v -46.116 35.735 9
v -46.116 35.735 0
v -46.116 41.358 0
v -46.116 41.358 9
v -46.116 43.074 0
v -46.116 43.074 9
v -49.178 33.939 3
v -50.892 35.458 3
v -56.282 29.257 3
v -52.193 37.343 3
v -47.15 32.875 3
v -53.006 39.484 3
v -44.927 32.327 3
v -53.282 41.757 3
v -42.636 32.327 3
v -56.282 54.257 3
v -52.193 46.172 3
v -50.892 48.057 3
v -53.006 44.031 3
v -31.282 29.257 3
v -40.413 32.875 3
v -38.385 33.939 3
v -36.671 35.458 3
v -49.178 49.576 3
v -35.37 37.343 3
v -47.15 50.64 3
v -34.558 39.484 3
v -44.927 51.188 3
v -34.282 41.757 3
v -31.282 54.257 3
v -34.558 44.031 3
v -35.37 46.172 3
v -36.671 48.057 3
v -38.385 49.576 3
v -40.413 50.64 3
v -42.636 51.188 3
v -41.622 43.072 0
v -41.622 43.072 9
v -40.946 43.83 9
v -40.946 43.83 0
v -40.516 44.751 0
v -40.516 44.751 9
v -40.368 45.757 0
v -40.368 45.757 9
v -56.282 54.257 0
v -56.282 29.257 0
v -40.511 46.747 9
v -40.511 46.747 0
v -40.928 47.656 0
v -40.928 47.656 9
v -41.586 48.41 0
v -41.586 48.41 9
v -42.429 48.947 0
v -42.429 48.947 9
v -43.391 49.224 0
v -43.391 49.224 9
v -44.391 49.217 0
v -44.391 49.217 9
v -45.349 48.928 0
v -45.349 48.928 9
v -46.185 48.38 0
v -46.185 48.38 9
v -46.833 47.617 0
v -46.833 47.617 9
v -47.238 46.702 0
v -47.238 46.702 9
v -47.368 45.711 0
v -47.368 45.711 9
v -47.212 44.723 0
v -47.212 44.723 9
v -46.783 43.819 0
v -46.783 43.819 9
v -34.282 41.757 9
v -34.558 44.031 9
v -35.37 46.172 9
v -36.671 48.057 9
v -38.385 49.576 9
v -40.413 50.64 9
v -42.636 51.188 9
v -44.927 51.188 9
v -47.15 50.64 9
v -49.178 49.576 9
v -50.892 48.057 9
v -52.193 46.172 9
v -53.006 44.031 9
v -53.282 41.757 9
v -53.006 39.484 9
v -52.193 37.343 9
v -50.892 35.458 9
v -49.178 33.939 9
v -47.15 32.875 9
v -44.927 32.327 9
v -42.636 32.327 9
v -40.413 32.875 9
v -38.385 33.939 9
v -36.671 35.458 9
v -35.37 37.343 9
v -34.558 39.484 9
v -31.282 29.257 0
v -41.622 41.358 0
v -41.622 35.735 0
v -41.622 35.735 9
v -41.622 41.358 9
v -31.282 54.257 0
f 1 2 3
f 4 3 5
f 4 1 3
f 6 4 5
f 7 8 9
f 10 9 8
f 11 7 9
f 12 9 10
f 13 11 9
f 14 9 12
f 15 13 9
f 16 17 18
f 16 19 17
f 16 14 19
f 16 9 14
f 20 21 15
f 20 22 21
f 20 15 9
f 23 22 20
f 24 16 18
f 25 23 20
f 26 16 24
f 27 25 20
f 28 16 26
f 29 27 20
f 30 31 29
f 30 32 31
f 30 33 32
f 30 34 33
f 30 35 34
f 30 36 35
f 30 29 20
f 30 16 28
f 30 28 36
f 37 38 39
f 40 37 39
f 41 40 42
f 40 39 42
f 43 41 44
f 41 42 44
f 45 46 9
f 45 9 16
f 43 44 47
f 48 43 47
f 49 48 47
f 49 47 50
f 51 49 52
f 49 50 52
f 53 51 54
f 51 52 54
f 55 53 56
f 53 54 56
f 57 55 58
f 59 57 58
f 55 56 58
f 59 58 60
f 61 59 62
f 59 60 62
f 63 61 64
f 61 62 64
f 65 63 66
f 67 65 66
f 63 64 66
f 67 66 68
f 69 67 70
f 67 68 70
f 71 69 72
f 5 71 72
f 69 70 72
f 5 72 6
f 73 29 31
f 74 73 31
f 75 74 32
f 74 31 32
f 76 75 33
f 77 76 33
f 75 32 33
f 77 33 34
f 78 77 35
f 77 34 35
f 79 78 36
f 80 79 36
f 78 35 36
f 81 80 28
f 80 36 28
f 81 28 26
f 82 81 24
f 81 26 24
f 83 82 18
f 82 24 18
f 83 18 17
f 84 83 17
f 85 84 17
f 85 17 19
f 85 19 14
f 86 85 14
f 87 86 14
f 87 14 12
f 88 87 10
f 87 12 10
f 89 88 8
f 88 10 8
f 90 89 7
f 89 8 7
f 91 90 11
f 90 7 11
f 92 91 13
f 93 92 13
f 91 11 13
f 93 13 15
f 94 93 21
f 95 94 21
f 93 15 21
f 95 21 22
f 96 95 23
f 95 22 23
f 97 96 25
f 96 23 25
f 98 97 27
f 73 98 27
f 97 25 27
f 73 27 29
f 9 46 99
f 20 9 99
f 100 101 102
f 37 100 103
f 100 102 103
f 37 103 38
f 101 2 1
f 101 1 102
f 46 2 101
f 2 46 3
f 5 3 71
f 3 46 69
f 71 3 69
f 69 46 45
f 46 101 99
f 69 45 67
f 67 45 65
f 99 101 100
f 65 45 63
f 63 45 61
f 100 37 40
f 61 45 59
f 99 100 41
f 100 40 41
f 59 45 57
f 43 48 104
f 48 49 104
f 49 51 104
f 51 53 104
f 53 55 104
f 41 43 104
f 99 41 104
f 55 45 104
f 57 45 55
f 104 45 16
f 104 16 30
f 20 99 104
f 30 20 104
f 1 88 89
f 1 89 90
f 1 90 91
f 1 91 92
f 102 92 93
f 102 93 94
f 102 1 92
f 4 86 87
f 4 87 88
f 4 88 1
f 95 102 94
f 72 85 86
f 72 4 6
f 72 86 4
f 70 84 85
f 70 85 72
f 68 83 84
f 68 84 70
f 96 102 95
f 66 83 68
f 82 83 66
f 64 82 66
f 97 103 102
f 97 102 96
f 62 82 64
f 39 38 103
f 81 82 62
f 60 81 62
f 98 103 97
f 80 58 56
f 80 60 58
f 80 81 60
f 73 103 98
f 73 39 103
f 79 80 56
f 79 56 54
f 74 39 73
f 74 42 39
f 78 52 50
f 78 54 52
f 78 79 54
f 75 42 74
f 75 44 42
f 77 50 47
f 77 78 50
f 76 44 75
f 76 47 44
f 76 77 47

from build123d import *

# Parameters (mm, degrees)
F0_W     = 25
F0_H     = 25
F1_DEPTH = 3
F2_R     = 9.5
F3_DEPTH = 6
F4_W     = 4.4934357473
F4_H     = 5.6233623327
F5_DEPTH = 9


with BuildPart() as f1:
    # F0 (on Top) → F1 (new body)
    with BuildSketch(Plane.XY):
        with Locations((-43.7815897167, 41.7574498571)):
            Rectangle(F0_W, F0_H)
    extrude(amount=F1_DEPTH)

    # F2 (on face) → F3 (join)
    with BuildSketch(Plane.XY.offset(3)):
        with Locations((-43.7815897167, 41.7574498571)):
            Circle(F2_R)
    extrude(amount=F3_DEPTH)

    # F4 (on face) → F5 (cut)
    with BuildSketch(Plane.XY.offset(9)):
        with Locations((-43.8689409503, 38.5465395694)):
            Rectangle(F4_W, F4_H)
        with BuildLine():
            ThreePointArc((-40.3680887796, 45.7565144868), (-45.3485456086, 48.9279885254), (-46.1156588239, 43.0735256877))
            Line((-46.1156588239, 43.0735256877), (-41.6222230767, 43.0735256877))
            Line((-41.6222230767, 43.0735256877), (-41.6222230767, 43.0720988624))
            ThreePointArc((-41.6222230767, 43.0720988624), (-40.6970849984, 44.2750506769), (-40.3680887796, 45.7565144868))
        make_face()
        with BuildLine():
            Line((-46.1156588239, 43.0735256877), (-46.1156588239, 41.3582207357))
            Line((-46.1156588239, 41.3582207357), (-41.6222230767, 41.3582207357))
            Line((-41.6222230767, 41.3582207357), (-41.6222230767, 43.0720988624))
            ThreePointArc((-41.6222230767, 43.0720988624), (-43.8692001537, 42.2565146632), (-46.1156588239, 43.0735256877))
        make_face()
        with BuildLine():
            Line((-41.6222230767, 43.0735256877), (-46.1156588239, 43.0735256877))
            ThreePointArc((-46.1156588239, 43.0735256877), (-43.8692001537, 42.2565146632), (-41.6222230767, 43.0720988624))
            Line((-41.6222230767, 43.0720988624), (-41.6222230767, 43.0735256877))
        make_face()
    extrude(amount=-F5_DEPTH, mode=Mode.SUBTRACT)


solid = f1.part
